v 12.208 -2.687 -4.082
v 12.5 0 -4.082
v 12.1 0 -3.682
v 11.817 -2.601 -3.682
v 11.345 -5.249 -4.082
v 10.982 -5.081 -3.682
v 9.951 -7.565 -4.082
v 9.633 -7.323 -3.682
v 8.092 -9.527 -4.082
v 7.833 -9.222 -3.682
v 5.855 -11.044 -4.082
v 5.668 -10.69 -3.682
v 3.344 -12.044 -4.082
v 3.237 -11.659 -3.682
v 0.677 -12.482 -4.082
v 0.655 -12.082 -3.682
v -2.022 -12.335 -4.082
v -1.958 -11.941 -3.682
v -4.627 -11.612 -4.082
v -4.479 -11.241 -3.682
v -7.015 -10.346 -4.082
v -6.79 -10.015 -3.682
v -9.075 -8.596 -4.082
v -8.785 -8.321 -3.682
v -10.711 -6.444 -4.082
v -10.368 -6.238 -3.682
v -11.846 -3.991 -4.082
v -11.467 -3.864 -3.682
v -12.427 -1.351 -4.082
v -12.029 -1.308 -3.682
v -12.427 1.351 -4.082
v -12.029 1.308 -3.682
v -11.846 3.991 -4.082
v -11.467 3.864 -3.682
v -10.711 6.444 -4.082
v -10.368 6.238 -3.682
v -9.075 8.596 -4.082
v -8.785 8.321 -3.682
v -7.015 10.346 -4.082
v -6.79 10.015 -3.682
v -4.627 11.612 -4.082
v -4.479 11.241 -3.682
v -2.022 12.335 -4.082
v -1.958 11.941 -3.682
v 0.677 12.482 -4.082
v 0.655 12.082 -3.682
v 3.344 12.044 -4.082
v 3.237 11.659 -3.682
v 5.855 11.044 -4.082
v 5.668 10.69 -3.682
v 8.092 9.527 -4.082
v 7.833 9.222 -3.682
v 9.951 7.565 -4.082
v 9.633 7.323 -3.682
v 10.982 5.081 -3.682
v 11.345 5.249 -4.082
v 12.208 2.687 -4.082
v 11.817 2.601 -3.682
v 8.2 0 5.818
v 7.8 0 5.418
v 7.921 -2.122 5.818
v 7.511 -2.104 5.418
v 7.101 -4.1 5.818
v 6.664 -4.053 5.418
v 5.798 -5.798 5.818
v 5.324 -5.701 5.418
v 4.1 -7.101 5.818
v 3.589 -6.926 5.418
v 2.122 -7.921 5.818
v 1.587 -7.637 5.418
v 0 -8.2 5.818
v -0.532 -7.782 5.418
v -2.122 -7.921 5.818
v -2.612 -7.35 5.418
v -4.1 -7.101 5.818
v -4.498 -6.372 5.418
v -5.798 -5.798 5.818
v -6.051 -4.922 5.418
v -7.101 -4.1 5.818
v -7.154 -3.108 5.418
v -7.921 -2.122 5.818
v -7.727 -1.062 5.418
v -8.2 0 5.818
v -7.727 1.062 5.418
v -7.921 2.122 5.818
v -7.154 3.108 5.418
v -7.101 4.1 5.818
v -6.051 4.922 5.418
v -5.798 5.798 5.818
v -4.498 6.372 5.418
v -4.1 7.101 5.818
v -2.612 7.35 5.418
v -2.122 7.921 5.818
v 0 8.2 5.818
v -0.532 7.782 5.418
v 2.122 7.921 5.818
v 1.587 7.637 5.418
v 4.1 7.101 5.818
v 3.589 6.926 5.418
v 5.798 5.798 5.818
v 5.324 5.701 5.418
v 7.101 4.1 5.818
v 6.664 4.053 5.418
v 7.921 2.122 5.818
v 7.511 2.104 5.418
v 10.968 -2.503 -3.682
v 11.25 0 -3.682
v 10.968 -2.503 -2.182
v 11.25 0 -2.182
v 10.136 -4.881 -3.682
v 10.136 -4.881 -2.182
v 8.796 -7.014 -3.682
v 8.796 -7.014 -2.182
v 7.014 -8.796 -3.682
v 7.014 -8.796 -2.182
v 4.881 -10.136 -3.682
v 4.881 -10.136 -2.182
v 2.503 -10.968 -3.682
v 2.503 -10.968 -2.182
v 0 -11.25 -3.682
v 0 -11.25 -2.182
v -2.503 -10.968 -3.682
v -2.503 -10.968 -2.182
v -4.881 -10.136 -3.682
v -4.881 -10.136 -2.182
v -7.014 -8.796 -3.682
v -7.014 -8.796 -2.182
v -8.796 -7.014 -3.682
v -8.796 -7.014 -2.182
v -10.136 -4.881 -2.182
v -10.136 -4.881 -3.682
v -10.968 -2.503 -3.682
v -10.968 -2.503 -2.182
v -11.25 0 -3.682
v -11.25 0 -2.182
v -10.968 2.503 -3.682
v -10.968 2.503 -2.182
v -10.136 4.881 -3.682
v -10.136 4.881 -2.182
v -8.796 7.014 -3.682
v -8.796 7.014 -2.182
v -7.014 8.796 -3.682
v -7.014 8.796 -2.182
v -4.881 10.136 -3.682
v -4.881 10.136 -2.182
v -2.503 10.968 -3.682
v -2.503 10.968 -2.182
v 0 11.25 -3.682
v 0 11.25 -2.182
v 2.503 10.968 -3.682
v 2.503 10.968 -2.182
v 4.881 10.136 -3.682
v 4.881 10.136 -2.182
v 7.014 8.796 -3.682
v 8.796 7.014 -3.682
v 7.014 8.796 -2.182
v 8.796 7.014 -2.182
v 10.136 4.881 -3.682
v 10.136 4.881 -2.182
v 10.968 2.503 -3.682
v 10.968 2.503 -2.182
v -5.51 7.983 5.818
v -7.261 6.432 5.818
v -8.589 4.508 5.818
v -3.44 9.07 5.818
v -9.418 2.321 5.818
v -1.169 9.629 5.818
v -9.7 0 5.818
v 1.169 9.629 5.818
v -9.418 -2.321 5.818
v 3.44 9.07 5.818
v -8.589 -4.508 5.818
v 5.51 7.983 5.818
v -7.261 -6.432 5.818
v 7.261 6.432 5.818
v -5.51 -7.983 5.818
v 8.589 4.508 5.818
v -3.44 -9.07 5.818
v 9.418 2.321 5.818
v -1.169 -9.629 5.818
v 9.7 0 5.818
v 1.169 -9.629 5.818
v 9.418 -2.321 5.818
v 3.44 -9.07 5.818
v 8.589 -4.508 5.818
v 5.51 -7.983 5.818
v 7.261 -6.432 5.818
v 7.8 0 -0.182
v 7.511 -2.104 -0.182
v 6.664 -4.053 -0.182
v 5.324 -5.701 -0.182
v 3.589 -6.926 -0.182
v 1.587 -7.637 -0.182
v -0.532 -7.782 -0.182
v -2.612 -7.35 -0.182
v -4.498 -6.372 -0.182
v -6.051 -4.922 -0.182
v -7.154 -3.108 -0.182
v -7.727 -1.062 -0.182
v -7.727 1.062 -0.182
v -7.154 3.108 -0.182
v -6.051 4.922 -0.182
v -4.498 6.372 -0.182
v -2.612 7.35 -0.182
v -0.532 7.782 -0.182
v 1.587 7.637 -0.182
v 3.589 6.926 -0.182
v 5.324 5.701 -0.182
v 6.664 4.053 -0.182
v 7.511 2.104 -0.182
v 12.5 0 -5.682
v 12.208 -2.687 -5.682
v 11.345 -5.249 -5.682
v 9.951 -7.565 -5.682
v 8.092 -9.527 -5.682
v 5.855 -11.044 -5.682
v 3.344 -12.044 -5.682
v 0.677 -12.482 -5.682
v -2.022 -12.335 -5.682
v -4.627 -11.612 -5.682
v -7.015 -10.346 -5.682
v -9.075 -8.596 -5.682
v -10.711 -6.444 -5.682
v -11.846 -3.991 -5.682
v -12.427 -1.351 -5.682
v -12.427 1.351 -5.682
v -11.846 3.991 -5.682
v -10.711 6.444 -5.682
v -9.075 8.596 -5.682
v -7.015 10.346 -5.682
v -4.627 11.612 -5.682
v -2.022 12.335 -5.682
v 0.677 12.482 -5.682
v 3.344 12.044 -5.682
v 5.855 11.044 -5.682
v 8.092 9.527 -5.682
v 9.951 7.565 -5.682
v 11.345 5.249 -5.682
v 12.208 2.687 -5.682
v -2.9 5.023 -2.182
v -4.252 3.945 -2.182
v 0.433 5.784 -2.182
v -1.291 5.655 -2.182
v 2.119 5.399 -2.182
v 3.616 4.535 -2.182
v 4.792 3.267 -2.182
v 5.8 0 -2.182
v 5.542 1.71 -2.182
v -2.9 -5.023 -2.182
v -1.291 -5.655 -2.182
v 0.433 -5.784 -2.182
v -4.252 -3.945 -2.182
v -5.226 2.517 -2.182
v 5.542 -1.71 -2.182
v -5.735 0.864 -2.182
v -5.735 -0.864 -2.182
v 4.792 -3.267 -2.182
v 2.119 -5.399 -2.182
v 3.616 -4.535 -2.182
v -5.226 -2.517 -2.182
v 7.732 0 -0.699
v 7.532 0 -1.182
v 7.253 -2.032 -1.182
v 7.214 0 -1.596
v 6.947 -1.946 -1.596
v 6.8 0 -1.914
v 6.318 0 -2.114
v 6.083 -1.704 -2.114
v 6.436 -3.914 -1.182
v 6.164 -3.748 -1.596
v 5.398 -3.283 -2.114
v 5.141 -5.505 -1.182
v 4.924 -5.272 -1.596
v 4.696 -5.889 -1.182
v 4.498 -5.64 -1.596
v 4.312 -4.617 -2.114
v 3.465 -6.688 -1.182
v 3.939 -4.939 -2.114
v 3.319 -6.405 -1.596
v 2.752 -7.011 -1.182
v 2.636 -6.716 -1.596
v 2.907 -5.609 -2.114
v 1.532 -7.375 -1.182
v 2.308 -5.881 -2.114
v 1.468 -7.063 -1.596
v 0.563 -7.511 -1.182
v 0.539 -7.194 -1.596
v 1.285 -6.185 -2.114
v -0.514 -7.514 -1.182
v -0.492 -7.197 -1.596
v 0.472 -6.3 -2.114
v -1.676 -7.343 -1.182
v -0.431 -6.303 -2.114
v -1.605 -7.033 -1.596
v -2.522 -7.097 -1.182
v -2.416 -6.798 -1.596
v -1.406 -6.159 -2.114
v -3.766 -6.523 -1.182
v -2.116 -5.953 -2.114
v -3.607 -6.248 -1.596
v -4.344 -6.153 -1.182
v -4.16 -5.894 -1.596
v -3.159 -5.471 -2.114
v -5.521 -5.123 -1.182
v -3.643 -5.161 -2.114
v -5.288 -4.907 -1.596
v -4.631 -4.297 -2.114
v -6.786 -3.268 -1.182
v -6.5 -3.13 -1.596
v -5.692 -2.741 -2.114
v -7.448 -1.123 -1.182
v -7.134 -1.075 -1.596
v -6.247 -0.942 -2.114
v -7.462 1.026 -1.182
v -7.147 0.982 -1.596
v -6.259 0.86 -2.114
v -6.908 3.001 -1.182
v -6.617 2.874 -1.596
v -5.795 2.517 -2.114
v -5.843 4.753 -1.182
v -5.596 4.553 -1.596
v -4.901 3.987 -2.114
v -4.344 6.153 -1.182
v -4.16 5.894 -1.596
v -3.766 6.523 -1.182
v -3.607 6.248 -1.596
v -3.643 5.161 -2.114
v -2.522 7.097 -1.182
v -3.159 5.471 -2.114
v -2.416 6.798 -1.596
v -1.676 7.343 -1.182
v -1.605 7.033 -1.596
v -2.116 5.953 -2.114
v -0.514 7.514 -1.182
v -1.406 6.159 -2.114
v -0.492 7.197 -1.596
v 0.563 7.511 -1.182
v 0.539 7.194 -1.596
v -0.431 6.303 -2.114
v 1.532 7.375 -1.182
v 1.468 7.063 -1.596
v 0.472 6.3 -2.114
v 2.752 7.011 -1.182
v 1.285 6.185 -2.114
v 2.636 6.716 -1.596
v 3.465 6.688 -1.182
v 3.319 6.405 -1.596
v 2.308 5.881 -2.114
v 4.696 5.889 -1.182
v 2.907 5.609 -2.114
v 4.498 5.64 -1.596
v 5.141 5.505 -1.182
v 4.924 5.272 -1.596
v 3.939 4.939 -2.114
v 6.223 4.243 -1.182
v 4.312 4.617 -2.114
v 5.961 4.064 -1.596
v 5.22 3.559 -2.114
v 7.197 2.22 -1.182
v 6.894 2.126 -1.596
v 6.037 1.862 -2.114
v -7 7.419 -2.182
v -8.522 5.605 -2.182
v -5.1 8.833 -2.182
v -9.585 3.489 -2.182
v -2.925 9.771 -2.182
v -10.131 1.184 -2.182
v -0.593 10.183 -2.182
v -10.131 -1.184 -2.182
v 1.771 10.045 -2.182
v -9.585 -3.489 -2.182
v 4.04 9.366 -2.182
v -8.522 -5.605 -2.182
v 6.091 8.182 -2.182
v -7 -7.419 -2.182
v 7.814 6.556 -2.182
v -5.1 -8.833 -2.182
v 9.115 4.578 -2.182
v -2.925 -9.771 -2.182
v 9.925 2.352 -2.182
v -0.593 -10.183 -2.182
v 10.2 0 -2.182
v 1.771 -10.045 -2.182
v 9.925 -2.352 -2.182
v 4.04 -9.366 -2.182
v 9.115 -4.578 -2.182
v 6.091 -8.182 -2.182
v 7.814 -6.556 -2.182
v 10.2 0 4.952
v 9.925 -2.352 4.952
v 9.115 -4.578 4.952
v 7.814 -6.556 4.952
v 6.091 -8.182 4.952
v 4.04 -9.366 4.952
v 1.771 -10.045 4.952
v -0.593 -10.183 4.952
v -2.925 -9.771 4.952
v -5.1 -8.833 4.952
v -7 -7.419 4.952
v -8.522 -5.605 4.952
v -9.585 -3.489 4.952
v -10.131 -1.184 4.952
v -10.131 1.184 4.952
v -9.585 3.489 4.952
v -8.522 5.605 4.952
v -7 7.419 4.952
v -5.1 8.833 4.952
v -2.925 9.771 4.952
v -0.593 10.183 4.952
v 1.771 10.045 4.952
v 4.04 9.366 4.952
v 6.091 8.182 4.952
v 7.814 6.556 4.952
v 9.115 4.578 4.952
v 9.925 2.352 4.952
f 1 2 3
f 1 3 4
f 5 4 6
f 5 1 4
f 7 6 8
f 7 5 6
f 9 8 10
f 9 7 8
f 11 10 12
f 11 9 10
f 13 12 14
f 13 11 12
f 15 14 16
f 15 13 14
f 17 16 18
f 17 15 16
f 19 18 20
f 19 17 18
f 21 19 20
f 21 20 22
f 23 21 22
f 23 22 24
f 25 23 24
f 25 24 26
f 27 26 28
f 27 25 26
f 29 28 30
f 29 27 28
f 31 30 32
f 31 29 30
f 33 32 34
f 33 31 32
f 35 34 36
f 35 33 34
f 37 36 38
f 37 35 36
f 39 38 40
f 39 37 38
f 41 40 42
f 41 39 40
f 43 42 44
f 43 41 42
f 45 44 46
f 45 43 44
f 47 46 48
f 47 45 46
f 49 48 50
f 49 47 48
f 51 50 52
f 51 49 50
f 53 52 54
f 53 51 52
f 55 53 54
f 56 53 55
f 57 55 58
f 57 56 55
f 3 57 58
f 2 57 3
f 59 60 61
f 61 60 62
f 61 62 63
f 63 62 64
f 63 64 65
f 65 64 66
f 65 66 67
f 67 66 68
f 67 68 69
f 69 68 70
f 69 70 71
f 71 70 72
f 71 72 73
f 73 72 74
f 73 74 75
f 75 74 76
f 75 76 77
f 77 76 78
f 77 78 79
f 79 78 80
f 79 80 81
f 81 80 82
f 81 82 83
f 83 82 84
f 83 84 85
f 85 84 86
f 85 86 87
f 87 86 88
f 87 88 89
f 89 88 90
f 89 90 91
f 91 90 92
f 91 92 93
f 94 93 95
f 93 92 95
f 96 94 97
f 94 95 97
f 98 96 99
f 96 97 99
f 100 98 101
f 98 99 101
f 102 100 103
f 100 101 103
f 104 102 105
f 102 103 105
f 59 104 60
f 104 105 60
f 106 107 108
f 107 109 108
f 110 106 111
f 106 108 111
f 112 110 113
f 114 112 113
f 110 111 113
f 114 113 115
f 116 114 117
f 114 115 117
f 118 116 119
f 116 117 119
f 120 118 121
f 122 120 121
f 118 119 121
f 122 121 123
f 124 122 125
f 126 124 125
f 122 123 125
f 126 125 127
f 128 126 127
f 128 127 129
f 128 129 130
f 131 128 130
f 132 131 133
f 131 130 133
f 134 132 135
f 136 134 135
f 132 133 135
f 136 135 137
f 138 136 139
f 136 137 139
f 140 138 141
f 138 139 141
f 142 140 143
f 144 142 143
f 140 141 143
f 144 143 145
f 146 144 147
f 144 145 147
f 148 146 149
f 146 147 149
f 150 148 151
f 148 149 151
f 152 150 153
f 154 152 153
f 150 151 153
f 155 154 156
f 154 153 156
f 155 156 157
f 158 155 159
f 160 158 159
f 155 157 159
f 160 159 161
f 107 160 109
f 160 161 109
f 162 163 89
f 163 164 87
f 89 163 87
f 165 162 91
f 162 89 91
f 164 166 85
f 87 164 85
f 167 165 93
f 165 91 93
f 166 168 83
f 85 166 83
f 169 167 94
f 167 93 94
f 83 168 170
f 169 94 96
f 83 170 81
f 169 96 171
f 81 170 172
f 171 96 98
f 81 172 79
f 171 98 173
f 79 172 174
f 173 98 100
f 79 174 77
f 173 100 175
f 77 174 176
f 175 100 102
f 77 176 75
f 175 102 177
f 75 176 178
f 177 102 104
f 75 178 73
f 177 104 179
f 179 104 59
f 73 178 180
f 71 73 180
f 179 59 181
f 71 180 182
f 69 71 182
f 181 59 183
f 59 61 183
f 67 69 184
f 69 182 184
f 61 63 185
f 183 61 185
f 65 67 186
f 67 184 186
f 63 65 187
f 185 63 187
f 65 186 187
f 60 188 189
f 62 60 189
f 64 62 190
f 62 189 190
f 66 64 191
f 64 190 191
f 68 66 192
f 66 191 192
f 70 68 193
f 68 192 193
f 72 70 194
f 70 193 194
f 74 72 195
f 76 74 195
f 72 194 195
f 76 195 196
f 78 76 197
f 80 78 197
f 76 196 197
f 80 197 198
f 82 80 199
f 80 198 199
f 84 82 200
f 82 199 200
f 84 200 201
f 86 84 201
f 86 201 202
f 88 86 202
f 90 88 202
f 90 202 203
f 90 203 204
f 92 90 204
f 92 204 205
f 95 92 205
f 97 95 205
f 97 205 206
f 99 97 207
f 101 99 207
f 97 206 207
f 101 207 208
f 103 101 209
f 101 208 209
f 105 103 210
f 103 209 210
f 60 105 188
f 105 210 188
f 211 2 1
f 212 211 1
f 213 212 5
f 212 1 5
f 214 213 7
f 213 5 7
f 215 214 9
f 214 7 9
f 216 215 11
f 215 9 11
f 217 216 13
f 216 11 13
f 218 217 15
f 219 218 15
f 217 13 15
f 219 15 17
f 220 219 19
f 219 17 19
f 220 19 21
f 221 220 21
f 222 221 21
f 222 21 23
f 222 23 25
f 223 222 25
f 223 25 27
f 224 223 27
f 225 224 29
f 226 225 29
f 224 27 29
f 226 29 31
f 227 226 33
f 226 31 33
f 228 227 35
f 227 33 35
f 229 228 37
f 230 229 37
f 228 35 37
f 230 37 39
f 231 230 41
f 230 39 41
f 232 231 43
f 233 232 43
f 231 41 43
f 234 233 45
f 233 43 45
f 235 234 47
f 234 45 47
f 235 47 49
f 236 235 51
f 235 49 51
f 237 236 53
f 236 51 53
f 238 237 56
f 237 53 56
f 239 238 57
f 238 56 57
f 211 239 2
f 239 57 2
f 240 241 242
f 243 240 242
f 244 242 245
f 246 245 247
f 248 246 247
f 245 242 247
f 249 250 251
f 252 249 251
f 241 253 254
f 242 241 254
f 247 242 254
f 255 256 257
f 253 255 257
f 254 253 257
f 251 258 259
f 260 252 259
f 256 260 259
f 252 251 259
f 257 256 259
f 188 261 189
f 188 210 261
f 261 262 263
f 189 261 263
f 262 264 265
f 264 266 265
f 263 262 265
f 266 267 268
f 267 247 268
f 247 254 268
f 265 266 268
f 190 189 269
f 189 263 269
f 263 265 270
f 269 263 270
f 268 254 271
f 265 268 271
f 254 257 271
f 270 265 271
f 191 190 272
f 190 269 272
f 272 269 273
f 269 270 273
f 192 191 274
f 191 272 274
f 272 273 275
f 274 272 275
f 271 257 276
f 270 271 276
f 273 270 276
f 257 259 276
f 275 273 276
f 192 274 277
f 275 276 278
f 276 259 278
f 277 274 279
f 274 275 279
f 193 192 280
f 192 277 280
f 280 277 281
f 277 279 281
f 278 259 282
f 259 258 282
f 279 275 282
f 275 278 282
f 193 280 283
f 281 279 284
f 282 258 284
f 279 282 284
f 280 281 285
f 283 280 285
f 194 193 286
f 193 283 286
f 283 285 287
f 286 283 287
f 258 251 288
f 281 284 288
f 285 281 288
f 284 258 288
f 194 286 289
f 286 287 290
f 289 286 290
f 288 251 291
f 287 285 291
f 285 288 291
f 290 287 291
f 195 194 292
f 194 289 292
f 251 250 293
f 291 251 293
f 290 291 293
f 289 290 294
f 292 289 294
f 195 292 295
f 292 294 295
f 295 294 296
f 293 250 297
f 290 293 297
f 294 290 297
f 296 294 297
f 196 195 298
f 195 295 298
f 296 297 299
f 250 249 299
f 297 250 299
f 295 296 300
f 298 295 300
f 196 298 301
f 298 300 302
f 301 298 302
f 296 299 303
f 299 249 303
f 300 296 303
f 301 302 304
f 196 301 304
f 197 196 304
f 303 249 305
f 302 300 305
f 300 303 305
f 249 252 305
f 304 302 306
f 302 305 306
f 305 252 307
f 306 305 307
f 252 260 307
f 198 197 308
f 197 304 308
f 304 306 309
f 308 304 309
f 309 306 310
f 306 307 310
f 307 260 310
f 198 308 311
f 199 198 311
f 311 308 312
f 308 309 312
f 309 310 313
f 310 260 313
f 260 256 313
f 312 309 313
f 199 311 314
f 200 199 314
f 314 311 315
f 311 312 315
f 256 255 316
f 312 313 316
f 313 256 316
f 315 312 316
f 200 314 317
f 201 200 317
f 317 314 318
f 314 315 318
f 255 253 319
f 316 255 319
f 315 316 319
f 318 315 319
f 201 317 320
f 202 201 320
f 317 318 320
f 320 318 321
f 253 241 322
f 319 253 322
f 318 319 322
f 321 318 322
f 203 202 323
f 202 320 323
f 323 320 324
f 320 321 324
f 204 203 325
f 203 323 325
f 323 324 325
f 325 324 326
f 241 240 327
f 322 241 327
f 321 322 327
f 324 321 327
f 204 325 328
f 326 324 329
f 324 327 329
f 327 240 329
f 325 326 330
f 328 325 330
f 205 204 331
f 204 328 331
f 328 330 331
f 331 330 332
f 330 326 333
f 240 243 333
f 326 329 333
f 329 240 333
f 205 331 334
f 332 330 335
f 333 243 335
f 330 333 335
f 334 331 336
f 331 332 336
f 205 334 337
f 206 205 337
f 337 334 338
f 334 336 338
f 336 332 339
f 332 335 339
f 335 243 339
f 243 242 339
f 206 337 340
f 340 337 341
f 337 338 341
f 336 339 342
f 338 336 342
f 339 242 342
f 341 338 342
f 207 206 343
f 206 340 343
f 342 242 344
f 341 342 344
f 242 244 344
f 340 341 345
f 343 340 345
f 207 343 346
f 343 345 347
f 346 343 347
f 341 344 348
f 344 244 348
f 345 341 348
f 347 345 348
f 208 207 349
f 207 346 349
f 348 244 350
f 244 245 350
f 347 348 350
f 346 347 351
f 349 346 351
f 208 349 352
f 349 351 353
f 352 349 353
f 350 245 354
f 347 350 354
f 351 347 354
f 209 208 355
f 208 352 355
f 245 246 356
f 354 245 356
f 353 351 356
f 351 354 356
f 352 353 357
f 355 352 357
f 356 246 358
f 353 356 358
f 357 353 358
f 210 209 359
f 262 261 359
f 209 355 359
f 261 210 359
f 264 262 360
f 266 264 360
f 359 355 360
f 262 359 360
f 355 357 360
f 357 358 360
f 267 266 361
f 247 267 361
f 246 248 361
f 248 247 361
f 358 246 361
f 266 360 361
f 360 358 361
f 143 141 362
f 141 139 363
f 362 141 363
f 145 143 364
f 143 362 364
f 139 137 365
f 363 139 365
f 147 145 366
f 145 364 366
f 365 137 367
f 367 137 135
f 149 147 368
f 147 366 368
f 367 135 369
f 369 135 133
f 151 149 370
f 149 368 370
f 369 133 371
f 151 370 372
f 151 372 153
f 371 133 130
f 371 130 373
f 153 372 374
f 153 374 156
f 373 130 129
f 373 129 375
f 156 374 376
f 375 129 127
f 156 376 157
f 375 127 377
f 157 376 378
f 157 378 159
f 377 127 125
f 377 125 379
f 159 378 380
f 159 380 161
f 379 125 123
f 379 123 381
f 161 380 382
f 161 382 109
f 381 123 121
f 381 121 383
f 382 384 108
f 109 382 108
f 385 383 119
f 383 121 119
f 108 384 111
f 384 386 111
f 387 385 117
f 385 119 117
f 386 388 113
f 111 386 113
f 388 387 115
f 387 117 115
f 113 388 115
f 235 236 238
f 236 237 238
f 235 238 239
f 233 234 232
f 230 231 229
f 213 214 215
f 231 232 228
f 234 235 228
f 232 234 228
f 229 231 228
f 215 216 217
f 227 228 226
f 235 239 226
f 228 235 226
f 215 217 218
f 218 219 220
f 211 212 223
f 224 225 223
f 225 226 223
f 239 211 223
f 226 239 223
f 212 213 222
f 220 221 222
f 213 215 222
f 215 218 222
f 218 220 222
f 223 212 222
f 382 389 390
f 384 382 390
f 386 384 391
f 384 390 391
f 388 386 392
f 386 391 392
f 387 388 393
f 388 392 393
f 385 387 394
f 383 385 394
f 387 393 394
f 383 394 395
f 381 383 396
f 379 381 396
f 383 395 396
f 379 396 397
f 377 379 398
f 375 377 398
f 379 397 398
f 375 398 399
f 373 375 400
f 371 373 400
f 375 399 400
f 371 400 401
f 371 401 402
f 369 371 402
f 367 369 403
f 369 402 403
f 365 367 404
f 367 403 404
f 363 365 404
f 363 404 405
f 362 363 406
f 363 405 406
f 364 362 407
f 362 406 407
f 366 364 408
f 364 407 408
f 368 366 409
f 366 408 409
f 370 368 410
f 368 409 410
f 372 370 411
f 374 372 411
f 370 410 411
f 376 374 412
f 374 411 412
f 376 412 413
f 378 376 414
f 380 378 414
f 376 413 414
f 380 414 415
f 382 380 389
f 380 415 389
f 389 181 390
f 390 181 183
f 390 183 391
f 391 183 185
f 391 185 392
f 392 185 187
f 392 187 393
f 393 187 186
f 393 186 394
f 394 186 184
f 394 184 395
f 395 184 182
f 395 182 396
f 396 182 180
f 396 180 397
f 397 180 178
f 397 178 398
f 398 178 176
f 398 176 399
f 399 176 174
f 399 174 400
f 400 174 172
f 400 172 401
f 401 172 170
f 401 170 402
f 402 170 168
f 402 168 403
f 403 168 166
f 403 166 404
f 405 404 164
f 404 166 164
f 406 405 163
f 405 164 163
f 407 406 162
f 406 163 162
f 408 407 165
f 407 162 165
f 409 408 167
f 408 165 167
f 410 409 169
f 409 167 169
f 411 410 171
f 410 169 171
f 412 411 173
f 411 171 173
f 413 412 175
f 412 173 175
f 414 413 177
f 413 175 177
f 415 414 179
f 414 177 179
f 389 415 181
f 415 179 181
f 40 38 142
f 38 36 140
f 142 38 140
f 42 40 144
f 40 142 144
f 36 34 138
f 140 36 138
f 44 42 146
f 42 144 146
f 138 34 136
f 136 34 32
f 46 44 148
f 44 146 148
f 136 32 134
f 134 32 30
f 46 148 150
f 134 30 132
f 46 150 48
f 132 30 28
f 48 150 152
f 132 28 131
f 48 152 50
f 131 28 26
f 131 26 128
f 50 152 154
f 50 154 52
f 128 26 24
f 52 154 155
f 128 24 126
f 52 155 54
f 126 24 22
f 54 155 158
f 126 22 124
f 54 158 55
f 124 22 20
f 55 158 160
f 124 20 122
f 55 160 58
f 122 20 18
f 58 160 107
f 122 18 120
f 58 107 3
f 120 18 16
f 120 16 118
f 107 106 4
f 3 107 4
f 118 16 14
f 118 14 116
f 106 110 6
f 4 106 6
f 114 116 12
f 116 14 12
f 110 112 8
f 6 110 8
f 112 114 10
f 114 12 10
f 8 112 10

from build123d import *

# Parameters (mm, degrees)
F2_R     = 2
F3_SIZE  = 0.4
F4_SIZE2 = 0.5
F4_SIZE  = 0.8660254038
F5_SIZE  = 0.4


with BuildPart() as f1:
    # F0 (on Front) → F1 (revolve)
    with BuildSketch(Plane.XZ):
        Polygon((10.2, 5.8181819119), (7.8, 5.8181819119), (7.8, -2.1818180881), (0, -2.1818180881), (0, -5.6818180881), (12.5, -5.6818180881), (12.5, -3.6818180881), (11.25, -3.6818180881), (11.25, -2.1818180881), (10.2, -2.1818180881), align=None)
    revolve(axis=Axis((0, 0, 1.239669376), (0, 0, -1)))

    # F2
    f2_edges = [f1.edges().sort_by_distance(p)[0] for p in [
        (-7.8, 0, -2.181818),
    ]]
    fillet(f2_edges, radius=F2_R)

    # F3
    f3_edges = [f1.edges().sort_by_distance(p)[0] for p in [
        (-12.5, 0, -3.681818),
    ]]
    chamfer(f3_edges, length=F3_SIZE)

    # F4
    f4_edges = [f1.edges().sort_by_distance(p)[0] for p in [
        (-10.2, 0, 5.818182),
    ]]
    f4_side = f1.faces().sort_by_distance((-10.2, 0, 1.818182))[0]
    chamfer(f4_edges, length=F4_SIZE, length2=F4_SIZE2, reference=f4_side)

    # F5
    f5_edges = [f1.edges().sort_by_distance(p)[0] for p in [
        (-7.8, 0, 5.818182),
    ]]
    chamfer(f5_edges, length=F5_SIZE)


solid = f1.part
